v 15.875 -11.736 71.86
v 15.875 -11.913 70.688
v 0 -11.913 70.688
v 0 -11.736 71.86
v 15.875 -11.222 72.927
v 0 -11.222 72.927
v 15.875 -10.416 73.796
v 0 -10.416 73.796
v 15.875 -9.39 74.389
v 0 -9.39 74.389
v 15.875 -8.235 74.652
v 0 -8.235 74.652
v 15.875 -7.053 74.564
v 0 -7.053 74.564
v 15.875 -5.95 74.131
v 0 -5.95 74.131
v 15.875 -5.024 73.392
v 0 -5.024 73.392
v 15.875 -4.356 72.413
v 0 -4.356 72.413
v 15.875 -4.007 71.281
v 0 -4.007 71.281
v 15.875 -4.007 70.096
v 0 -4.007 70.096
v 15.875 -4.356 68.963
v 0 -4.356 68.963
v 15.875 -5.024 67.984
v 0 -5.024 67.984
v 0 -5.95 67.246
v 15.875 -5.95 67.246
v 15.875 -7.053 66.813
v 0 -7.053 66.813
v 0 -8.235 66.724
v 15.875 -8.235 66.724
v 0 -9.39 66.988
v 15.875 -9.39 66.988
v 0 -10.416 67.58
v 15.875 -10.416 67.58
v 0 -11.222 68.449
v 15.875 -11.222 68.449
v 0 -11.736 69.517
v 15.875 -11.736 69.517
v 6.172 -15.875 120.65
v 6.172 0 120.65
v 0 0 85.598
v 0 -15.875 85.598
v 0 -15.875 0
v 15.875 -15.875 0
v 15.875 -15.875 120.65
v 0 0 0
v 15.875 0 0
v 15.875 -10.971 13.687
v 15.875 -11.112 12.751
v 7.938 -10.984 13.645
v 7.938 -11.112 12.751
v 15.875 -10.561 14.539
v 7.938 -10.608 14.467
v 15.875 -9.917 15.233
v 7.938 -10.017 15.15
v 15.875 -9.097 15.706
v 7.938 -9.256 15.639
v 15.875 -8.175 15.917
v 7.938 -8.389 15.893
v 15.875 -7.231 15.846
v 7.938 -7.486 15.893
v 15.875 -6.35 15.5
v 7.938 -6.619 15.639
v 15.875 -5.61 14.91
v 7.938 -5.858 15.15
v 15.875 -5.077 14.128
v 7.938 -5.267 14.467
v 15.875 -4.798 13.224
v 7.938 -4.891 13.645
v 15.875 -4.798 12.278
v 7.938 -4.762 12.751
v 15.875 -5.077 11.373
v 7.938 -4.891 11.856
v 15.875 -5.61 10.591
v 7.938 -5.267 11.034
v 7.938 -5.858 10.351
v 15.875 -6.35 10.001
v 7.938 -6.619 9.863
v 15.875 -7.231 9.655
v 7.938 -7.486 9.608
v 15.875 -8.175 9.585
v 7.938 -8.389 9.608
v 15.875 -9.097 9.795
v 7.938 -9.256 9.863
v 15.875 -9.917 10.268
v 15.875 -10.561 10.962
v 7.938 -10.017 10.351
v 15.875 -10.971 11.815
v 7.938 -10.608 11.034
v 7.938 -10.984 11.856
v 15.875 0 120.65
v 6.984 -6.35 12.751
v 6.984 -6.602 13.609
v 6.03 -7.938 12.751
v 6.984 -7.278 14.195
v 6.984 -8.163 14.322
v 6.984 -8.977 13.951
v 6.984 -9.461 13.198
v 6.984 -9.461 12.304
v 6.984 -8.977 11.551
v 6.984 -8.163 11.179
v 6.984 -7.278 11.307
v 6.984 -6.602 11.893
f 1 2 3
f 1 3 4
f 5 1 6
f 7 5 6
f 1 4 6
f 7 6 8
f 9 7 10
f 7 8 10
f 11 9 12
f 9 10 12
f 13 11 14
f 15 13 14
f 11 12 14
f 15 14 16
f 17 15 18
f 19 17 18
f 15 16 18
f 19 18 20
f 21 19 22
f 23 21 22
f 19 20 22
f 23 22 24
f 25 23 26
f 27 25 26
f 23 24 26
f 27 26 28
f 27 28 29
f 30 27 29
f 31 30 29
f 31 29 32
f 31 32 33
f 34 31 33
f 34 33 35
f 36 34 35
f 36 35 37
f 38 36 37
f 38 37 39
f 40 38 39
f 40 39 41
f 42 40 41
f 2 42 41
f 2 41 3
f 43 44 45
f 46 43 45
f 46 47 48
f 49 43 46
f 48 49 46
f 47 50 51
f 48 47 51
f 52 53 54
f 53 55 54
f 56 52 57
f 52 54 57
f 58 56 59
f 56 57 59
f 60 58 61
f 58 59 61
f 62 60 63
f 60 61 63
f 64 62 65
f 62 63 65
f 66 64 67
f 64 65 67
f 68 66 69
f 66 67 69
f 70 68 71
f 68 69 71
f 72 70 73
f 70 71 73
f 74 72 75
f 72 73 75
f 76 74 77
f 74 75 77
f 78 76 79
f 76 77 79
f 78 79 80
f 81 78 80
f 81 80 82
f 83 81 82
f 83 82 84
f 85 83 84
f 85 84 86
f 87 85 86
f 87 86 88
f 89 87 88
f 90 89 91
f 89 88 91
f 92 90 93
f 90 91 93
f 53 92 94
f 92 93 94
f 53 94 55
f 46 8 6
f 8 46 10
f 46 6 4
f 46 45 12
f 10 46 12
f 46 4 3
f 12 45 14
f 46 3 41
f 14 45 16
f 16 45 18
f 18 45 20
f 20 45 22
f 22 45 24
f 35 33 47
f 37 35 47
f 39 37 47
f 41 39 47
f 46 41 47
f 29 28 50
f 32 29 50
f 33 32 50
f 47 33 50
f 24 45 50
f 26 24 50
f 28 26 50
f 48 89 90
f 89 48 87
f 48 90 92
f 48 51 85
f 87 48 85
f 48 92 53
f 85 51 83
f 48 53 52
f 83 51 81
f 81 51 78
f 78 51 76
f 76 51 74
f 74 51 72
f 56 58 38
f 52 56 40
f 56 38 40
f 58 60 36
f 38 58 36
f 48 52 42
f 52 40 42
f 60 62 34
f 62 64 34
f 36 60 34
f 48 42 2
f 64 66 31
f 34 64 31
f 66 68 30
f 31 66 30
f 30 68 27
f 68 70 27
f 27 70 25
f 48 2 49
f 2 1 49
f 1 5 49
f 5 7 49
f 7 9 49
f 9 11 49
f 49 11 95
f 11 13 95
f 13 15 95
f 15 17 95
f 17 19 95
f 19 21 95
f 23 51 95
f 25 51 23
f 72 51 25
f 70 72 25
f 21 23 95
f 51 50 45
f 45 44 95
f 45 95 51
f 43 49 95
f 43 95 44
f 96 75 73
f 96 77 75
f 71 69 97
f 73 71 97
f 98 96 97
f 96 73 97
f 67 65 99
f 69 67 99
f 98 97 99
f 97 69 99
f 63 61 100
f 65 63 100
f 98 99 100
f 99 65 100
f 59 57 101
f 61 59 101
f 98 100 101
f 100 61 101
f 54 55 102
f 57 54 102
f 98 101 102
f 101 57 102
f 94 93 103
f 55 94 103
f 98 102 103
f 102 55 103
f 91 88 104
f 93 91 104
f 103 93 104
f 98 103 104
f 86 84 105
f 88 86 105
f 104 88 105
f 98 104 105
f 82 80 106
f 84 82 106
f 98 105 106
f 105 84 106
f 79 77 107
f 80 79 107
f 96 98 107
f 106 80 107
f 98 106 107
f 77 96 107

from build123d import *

# Parameters (mm, degrees)
F1_DEPTH = 15.875
F3_D     = 6.35
F3_DEPTH = 7.9375
F3_TIP   = 1.9077324654
F5_D     = 7.9502


with BuildPart() as f1:
    # F0 (on Front) → F1 (new body)
    with BuildSketch(Plane.XZ):
        Polygon((0, 85.598), (0, 0), (15.875, 0), (15.875, 120.65), (6.1722, 120.65), align=None)
    extrude(amount=F1_DEPTH)

    # F3
    with Locations(Plane.YZ.offset(15.875)):
        with Locations((-7.9375, 12.7508)):
            Hole(F3_D / 2, depth=F3_DEPTH)
            with Locations((0, 0, -(F3_DEPTH + F3_TIP / 2))):  # 118° drill point
                Cone(0, F3_D / 2, F3_TIP, mode=Mode.SUBTRACT)

    # F5 (through all)
    with Locations(Plane.YZ.offset(15.875)):
        with Locations((-7.9375, 70.6882)):
            Hole(F5_D / 2)


solid = f1.part
